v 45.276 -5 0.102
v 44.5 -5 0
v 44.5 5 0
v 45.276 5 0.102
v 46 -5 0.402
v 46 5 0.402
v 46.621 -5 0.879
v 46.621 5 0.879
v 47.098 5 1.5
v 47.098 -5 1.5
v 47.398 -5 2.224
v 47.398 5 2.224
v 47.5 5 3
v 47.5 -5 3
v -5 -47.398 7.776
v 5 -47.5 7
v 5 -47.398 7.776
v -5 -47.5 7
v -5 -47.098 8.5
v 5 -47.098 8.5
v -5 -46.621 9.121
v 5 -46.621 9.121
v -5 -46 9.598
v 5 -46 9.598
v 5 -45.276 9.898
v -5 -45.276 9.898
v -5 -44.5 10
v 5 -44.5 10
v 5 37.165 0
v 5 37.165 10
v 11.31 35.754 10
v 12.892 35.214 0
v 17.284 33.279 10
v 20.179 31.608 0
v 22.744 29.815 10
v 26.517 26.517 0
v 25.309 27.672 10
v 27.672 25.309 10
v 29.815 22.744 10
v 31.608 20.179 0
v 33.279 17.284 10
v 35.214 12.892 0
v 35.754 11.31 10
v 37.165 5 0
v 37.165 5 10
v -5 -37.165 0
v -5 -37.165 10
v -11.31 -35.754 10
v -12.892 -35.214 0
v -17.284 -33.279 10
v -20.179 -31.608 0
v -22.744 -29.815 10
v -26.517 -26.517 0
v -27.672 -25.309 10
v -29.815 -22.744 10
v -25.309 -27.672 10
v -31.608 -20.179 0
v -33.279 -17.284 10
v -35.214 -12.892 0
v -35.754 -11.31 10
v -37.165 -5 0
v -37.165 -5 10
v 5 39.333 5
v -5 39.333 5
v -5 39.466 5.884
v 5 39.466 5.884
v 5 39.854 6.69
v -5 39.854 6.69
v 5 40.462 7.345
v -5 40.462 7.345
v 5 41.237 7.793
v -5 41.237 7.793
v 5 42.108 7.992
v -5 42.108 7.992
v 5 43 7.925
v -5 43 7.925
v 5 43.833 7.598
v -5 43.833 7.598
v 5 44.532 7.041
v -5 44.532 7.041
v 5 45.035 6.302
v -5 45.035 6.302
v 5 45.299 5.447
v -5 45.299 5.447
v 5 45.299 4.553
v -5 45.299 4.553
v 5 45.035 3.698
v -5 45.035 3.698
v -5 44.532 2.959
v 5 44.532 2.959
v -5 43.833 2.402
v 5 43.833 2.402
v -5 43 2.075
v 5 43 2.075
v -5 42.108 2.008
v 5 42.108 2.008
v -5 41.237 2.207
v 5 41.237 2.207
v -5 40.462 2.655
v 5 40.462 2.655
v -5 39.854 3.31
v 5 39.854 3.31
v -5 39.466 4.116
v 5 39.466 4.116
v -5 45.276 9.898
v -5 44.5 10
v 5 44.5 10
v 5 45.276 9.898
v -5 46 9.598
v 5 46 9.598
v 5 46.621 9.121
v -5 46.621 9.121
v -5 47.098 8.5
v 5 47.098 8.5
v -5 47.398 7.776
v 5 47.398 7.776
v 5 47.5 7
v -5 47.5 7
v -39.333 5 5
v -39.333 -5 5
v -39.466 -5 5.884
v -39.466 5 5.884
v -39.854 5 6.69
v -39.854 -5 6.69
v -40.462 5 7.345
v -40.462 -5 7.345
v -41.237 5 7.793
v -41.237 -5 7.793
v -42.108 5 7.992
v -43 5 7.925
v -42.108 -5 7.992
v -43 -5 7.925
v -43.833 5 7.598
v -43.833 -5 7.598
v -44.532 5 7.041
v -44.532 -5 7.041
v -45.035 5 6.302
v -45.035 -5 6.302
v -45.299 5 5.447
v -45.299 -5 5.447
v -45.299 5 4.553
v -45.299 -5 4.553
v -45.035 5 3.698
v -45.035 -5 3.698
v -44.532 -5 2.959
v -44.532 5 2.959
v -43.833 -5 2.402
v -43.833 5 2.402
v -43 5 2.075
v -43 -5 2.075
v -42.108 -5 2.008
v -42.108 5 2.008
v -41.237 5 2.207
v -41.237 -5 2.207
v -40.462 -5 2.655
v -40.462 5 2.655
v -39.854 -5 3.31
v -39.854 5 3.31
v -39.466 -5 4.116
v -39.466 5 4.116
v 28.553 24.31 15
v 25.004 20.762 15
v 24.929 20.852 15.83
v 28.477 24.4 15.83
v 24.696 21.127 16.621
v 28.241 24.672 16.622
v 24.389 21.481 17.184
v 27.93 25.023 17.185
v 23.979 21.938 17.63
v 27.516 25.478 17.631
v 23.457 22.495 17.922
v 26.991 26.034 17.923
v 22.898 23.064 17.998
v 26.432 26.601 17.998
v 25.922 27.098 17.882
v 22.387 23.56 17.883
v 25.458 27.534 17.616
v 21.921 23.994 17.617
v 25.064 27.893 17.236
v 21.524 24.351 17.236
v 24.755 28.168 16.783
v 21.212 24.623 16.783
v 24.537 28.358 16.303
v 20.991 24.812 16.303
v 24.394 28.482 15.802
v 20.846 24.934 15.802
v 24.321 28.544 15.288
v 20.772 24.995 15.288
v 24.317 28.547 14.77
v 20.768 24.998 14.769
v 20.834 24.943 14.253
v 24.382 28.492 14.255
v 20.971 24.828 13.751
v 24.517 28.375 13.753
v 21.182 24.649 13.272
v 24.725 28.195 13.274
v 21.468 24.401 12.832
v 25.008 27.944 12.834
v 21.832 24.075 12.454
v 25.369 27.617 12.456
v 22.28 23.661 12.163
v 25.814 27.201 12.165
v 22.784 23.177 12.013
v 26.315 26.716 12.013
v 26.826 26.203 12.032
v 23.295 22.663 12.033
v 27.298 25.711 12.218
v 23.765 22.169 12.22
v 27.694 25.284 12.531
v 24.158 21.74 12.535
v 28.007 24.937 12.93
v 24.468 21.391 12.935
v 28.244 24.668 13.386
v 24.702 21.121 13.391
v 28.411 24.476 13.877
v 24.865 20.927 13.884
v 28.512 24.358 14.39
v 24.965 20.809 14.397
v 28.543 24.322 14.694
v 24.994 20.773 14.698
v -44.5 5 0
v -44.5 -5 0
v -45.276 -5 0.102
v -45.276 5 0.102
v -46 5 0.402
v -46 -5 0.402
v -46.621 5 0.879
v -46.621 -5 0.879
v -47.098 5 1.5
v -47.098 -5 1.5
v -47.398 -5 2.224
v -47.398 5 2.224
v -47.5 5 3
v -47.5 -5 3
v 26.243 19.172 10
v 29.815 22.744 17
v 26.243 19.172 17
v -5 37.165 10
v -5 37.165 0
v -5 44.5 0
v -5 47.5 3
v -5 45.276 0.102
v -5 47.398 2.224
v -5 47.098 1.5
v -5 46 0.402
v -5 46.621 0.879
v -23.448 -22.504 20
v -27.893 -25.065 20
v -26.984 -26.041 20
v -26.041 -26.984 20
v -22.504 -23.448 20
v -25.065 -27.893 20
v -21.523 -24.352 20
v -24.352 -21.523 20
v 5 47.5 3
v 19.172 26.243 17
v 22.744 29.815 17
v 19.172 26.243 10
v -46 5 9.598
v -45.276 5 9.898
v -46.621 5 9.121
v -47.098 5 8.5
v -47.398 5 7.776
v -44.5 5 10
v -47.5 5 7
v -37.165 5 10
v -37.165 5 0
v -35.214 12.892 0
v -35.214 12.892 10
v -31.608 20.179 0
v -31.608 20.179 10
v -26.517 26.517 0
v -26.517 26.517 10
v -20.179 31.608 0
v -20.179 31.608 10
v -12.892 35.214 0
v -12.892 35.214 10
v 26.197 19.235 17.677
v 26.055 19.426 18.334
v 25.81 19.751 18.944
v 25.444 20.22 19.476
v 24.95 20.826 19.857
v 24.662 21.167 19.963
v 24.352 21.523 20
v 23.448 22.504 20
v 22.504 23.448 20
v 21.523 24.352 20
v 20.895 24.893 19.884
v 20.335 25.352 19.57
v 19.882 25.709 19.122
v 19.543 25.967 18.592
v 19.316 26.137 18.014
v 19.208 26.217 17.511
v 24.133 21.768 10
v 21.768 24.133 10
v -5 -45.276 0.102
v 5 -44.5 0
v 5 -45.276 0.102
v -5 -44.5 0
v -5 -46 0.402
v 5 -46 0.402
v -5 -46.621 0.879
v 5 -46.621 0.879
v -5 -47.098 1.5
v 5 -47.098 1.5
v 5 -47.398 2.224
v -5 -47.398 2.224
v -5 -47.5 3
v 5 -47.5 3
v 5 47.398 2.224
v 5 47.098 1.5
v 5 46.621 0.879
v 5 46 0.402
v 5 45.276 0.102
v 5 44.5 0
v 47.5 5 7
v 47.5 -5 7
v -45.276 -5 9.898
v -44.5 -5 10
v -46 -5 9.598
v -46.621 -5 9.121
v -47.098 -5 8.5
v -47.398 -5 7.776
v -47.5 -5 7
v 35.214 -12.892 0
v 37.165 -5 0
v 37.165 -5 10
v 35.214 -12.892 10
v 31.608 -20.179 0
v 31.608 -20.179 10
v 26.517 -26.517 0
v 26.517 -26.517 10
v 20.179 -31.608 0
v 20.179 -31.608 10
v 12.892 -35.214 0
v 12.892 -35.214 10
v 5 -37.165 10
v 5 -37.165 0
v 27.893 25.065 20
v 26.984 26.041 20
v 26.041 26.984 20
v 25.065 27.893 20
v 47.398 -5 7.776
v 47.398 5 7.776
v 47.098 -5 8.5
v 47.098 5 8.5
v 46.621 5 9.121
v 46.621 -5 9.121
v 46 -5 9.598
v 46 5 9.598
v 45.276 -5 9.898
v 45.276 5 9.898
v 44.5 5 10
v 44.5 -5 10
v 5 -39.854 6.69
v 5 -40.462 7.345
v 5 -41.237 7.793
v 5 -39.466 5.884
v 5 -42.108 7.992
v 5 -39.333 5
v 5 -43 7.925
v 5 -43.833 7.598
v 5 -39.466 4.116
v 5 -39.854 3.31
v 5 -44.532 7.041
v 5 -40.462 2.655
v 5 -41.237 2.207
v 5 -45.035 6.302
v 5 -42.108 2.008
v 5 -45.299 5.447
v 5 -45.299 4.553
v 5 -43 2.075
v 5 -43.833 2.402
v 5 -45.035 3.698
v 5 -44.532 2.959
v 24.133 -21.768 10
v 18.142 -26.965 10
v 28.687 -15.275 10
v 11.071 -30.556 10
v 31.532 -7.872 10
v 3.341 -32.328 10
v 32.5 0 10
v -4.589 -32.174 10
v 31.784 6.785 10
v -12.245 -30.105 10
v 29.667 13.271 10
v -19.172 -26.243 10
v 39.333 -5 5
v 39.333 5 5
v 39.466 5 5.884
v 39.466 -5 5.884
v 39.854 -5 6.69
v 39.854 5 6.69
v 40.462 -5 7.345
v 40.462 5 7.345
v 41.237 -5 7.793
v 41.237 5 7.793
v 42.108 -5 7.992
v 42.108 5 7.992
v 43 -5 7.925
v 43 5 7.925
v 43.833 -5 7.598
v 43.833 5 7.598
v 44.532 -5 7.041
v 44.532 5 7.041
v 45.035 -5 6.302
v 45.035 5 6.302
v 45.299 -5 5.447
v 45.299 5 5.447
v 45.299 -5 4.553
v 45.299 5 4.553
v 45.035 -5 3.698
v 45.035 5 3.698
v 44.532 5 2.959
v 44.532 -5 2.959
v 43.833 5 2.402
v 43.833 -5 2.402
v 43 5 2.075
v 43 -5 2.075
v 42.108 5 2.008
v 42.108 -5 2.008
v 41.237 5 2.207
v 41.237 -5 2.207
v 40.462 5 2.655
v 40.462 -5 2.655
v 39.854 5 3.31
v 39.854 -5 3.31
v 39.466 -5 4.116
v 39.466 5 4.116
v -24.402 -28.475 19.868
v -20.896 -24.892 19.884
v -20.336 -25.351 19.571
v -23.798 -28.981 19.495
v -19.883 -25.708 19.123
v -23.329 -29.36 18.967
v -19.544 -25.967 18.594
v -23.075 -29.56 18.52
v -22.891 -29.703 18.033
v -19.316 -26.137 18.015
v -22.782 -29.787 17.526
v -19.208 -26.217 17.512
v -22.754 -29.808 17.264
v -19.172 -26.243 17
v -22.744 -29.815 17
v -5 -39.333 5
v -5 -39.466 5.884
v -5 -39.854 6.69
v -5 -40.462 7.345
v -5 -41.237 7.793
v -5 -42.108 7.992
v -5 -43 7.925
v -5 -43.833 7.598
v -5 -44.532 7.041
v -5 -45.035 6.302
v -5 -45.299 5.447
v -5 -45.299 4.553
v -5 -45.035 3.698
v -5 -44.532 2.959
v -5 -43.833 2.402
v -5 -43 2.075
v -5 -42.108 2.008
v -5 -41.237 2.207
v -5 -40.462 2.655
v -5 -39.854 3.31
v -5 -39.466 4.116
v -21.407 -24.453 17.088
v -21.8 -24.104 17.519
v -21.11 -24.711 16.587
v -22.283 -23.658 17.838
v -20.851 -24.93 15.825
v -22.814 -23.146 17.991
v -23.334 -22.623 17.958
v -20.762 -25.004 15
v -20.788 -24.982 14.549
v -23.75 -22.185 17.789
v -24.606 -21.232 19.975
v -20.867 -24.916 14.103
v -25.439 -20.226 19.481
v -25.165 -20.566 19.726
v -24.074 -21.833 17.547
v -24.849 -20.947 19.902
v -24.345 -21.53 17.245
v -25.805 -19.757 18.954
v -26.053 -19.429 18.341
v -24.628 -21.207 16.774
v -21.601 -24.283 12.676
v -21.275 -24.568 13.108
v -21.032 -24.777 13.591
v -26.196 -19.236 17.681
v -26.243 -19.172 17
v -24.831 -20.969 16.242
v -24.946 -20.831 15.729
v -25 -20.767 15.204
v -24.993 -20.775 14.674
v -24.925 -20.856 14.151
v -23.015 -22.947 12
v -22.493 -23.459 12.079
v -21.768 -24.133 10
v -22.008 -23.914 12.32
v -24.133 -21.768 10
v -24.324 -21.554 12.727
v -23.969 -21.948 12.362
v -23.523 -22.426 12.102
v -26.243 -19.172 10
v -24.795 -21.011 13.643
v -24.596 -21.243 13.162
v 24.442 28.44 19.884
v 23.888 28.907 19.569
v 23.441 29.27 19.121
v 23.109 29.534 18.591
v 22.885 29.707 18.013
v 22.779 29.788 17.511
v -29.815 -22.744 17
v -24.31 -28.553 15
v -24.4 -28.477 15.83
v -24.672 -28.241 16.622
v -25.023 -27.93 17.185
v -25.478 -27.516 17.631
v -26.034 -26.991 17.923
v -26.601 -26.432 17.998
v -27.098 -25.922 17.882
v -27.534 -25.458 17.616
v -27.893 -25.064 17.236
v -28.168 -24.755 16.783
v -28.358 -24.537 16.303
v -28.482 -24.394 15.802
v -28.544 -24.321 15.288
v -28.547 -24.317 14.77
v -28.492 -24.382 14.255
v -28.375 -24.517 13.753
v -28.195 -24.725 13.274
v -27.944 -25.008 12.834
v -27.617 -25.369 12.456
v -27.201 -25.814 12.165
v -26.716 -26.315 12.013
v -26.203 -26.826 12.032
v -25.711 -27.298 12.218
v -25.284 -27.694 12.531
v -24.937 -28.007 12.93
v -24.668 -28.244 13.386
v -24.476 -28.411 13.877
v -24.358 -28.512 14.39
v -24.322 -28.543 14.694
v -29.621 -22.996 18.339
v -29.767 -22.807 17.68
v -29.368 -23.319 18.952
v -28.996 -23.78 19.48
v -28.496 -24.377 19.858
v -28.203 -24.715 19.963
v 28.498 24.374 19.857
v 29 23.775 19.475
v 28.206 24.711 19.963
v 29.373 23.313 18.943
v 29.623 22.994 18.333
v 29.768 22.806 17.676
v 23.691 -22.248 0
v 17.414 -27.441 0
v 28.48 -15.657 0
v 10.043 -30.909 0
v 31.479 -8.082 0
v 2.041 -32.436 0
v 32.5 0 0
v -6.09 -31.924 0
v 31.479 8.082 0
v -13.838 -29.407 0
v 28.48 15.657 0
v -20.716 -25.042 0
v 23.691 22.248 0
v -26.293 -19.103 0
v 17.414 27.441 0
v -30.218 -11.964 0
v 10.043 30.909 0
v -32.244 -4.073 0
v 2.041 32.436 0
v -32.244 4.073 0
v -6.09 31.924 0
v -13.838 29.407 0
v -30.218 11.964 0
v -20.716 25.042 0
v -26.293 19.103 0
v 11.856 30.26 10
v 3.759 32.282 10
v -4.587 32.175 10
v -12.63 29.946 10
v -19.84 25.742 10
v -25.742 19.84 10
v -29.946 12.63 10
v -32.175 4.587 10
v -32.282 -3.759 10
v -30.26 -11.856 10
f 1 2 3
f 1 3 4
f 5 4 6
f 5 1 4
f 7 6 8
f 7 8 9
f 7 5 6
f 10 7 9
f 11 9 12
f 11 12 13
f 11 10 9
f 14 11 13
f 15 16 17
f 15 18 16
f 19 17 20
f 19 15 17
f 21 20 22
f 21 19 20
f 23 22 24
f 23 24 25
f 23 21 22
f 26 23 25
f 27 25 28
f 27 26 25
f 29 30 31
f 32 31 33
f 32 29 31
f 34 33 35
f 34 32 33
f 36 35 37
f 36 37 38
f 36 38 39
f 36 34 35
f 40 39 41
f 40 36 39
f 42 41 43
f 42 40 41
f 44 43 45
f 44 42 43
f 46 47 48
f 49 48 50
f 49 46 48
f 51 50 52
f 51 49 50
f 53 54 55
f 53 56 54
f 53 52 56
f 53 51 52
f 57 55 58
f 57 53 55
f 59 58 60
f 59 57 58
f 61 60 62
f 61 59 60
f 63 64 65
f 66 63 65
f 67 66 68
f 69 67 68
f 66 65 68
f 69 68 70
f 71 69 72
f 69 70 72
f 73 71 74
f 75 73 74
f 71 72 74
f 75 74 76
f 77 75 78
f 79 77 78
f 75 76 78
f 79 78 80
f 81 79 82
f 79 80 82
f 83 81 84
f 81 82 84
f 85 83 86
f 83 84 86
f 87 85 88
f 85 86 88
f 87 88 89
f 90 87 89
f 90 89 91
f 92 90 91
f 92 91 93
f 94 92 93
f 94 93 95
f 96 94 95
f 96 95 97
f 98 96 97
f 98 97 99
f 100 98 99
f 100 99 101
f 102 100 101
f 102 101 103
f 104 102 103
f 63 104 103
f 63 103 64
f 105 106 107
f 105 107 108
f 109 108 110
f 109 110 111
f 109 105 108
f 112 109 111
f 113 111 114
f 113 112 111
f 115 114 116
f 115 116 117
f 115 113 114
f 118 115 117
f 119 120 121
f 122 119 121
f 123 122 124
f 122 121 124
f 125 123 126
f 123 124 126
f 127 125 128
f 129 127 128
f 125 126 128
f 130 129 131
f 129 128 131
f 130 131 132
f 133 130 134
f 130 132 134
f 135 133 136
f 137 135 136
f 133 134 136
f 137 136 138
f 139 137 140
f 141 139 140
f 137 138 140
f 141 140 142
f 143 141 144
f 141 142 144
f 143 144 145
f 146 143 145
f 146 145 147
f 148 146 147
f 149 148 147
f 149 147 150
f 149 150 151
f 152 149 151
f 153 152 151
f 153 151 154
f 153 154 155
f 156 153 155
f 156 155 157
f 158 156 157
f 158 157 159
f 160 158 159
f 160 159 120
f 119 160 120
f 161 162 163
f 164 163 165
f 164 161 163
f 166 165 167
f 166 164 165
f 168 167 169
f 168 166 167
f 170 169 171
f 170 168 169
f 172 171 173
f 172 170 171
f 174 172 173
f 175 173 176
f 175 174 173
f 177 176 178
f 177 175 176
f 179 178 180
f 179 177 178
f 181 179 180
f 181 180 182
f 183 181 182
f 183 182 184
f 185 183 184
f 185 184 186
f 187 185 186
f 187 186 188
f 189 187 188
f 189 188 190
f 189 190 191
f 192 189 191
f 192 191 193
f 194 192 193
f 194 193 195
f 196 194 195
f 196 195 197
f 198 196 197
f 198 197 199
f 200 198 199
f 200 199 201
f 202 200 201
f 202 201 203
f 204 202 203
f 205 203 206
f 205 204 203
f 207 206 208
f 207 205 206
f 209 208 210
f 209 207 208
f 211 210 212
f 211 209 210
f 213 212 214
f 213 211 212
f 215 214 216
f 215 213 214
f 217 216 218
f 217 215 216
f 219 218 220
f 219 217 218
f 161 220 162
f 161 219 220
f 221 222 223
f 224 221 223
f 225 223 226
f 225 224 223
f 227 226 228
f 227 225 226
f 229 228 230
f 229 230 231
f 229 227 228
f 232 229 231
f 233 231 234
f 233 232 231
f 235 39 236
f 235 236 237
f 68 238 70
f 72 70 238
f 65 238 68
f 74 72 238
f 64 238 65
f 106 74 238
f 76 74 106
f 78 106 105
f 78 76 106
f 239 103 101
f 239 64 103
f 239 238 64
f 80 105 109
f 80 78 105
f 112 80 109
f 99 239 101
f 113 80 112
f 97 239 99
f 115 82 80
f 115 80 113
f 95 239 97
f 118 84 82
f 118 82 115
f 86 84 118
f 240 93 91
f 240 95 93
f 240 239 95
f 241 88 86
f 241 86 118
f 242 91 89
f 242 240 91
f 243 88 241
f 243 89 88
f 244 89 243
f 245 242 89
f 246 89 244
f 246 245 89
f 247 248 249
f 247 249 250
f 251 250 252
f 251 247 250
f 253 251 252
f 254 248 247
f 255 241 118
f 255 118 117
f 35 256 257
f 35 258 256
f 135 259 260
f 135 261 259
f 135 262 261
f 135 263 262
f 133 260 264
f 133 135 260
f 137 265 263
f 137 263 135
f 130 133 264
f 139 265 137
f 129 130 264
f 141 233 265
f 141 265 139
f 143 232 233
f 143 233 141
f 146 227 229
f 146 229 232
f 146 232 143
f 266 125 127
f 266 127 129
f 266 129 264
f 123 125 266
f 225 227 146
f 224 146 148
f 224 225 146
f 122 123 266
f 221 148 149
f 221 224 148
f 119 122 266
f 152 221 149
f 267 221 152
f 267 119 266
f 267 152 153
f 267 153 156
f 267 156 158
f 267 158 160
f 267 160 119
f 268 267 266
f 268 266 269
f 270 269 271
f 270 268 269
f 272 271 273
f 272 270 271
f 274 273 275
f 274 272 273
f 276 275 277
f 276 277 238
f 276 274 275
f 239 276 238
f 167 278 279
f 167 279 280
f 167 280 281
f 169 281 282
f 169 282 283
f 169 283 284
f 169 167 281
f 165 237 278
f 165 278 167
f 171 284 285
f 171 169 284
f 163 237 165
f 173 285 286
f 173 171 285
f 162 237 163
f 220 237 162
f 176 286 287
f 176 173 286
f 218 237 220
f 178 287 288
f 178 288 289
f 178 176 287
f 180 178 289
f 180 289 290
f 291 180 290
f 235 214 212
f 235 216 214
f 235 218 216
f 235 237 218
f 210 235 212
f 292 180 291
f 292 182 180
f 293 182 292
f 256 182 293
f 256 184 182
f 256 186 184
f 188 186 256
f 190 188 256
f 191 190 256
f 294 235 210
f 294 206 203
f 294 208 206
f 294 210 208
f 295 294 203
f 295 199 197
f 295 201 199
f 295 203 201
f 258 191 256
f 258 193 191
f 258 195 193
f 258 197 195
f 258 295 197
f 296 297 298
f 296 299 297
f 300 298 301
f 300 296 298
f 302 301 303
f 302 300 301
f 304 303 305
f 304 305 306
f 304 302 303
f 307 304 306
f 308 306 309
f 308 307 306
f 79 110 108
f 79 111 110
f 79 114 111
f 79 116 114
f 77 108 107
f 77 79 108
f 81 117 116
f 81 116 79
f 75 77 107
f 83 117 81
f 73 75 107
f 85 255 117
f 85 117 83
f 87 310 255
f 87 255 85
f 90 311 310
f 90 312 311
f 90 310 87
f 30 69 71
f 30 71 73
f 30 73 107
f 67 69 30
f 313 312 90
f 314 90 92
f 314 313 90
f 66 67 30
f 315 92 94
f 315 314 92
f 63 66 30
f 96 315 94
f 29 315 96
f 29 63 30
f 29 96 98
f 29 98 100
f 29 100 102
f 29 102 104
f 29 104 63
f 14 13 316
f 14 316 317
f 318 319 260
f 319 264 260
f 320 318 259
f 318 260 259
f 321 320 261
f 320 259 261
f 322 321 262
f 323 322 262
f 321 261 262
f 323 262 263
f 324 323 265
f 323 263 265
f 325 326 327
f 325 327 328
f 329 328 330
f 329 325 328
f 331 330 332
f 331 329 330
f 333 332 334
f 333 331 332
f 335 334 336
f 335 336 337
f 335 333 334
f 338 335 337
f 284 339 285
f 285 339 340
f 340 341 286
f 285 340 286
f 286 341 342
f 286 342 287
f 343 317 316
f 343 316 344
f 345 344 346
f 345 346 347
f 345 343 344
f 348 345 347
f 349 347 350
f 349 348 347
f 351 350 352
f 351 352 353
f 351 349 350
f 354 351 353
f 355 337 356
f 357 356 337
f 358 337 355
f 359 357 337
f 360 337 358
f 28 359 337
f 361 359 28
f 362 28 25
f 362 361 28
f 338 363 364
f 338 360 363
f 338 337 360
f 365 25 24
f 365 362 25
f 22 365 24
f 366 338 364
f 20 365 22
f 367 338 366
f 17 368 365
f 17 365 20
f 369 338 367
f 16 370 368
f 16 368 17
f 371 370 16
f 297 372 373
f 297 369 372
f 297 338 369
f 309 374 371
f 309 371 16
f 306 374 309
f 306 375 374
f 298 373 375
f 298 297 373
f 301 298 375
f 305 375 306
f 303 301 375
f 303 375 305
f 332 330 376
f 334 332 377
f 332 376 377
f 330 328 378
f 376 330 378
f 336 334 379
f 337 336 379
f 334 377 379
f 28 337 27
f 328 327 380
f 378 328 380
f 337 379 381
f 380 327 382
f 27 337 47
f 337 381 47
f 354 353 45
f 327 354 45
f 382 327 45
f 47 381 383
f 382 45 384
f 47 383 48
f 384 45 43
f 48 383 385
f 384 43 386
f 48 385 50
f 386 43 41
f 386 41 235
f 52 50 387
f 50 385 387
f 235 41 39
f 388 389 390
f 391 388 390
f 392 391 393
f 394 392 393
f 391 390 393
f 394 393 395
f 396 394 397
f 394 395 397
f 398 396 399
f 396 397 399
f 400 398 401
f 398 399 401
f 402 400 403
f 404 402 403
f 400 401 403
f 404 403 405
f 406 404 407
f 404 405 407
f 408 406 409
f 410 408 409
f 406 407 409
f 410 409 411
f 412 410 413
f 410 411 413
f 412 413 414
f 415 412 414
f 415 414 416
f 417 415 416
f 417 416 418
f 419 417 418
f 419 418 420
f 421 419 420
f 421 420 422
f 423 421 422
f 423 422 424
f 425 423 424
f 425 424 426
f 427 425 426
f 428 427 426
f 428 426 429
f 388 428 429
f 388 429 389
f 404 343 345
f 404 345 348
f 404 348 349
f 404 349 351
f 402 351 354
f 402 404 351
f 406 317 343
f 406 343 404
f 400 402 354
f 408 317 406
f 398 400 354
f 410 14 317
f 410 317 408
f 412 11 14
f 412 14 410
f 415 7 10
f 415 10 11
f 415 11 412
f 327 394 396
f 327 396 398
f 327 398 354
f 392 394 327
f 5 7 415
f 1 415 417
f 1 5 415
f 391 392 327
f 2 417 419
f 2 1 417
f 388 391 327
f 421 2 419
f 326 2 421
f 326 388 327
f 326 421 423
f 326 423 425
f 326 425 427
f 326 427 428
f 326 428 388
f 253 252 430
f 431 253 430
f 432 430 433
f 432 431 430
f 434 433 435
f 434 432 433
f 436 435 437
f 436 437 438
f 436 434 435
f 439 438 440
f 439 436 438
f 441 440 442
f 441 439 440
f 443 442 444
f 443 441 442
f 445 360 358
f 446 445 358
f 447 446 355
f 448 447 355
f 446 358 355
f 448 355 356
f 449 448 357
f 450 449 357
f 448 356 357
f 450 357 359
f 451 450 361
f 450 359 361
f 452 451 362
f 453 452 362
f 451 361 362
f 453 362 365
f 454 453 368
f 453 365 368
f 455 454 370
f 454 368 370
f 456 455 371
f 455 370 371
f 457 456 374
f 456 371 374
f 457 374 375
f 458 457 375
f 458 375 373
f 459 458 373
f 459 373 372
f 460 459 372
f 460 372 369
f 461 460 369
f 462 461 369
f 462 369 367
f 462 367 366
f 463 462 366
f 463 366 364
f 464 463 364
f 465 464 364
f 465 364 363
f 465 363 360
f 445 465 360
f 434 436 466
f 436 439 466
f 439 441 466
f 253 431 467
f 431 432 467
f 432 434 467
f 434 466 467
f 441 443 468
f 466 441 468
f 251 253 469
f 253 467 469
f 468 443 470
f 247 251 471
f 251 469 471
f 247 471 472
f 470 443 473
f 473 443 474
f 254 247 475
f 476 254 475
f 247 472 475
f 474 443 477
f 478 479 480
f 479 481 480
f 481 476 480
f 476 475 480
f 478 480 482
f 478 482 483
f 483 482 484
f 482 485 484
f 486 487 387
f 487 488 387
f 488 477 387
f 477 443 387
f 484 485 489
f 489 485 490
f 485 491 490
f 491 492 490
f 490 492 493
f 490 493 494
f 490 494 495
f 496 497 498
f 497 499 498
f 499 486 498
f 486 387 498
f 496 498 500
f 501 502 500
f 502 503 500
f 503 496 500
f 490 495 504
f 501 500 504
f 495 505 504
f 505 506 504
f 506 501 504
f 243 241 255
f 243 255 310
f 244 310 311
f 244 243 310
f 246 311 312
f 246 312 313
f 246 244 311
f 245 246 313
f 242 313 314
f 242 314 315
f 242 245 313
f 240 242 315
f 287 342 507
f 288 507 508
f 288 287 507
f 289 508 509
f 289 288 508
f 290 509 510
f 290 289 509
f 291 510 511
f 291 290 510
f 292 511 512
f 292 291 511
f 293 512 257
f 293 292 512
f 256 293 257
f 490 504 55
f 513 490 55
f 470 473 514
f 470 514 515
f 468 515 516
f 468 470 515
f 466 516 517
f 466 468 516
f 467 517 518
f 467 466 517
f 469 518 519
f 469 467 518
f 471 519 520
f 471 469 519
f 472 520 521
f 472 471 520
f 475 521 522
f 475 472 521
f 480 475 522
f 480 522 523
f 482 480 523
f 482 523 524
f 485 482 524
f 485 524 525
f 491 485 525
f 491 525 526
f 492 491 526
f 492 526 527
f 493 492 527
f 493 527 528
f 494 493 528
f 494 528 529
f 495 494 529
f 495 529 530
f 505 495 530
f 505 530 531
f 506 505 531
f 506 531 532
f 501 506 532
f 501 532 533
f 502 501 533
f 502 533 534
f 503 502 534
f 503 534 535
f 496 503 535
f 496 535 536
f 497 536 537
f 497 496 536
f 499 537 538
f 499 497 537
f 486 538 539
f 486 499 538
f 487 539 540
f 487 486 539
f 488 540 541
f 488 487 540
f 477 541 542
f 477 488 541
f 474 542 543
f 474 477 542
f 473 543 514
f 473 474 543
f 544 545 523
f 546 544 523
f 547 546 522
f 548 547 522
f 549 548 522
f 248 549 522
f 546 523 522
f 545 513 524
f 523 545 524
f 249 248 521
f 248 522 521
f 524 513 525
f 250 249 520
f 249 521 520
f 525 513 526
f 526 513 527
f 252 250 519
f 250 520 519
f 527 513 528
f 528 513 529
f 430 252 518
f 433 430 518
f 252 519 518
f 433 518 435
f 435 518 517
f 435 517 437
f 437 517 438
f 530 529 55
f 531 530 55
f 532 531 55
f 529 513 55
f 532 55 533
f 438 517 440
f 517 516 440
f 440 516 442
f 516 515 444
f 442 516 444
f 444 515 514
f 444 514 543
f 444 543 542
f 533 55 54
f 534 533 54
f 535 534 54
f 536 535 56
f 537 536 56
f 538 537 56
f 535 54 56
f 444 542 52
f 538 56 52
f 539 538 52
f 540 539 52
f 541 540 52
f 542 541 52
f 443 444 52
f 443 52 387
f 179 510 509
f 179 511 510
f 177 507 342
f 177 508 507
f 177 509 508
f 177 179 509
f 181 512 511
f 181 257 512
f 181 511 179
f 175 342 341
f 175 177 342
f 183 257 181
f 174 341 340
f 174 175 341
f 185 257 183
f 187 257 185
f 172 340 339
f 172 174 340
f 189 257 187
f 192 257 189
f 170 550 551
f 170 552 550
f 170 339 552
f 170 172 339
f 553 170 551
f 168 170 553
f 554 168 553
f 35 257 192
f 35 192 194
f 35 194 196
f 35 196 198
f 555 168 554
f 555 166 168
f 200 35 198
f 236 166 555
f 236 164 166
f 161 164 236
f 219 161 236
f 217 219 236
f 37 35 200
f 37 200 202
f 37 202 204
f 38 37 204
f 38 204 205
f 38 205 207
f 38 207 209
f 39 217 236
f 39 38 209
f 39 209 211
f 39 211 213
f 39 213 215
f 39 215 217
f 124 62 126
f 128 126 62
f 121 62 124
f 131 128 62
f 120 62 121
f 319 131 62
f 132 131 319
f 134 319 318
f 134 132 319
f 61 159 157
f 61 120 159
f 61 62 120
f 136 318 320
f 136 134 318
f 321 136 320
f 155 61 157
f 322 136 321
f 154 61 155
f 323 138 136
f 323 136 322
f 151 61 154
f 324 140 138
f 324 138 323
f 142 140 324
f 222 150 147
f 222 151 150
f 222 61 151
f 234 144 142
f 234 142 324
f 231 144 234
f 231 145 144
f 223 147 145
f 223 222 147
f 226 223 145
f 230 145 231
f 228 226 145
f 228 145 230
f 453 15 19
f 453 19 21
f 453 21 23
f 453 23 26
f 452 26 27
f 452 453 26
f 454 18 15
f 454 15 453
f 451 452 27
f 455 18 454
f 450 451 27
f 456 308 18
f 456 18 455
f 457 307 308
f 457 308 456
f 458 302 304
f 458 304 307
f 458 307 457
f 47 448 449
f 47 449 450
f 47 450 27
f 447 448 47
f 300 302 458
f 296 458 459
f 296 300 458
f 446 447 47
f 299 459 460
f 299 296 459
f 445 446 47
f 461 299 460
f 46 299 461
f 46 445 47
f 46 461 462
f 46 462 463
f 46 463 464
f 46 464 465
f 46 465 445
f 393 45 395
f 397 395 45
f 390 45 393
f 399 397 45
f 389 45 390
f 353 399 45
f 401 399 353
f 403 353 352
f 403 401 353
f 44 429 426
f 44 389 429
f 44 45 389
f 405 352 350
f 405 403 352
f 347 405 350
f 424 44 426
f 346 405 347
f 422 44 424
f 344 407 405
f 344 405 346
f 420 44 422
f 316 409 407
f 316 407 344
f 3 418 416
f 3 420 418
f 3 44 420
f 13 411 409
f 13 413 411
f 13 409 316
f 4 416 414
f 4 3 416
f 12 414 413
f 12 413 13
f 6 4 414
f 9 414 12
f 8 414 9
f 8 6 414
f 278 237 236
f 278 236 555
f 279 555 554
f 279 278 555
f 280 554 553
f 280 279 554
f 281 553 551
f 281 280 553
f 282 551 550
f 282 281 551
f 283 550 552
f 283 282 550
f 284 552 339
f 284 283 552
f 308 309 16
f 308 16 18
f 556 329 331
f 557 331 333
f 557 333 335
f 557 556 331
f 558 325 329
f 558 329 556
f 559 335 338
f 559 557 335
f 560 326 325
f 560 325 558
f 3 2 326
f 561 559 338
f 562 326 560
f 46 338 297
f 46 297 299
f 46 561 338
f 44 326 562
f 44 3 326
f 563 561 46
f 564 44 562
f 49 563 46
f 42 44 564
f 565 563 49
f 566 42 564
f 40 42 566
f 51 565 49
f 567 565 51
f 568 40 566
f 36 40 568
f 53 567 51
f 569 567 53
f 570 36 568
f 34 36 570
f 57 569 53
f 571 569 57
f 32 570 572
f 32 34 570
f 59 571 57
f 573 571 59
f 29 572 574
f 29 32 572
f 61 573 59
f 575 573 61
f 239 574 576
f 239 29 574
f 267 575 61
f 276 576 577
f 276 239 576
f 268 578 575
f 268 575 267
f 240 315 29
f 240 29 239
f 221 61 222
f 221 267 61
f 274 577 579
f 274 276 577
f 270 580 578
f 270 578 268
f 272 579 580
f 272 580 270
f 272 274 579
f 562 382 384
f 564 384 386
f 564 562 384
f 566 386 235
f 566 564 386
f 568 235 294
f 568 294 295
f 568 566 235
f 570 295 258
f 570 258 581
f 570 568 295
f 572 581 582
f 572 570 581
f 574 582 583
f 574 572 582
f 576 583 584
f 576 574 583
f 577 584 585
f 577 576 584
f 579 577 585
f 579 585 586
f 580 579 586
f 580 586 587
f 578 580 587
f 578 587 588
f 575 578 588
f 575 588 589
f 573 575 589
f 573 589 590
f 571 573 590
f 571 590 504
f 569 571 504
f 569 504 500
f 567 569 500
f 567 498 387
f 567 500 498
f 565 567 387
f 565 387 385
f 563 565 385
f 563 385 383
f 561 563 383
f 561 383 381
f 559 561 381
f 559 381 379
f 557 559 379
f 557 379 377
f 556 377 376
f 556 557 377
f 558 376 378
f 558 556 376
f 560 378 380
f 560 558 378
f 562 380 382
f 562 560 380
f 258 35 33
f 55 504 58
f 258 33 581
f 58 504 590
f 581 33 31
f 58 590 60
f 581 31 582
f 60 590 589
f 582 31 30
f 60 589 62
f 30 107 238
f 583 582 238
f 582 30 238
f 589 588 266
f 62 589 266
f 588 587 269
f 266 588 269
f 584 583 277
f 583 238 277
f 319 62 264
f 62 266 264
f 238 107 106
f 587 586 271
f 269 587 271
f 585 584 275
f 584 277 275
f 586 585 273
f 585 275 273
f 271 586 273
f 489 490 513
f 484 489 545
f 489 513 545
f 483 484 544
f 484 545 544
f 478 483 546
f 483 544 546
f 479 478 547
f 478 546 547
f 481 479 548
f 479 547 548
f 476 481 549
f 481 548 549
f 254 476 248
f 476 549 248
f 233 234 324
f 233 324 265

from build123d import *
from build123d.topology import SkipClean

# Parameters (mm, degrees)
CROQUIS1_R                 = 32.5
SALIENTE_EXTRUIR1_DEPTH    = 10
CROQUIS2_R                 = 3
CORTAR_EXTRUIR1_DEPTH      = 72.50174823
MATRIZC1_COUNT             = 4
SALIENTE_EXTRUIR2_DEPTH    = 10
CORTAR_EXTRUIR2_DEPTH      = 71.089228844
CORTAR_EXTRUIR2_DEPTH_BACK = 71.089228844
CROQUIS4_R                 = 3
REDONDEO1_R                = 3
SIMETR_A3_START            = 32.113081288
SIMETR_A3_DEPTH            = 5.333547499
SIMETR_A3_START_2          = -5
SIMETR_A3_2_DEPTH          = 10
SIMETR_A3_3_DEPTH          = 10


# Read off the part's stored shape, not the designer's step: Simetría3
with BuildPart() as part:
    # Croquis1 → Saliente-Extruir1 (new body)
    with BuildSketch(Plane.XY):
        with BuildLine():
            Line((-5, 47.5), (5, 47.5))
            Line((5, 47.5), (5, 37.165171868))
            ThreePointArc((5, 37.165171868), (26.516504294, 26.516504294), (37.165171868, 5))
            Line((37.165171868, 5), (47.5, 5))
            Line((47.5, 5), (47.5, -5))
            Line((47.5, -5), (37.165171868, -5))
            ThreePointArc((37.165171868, -5), (26.516504294, -26.516504294), (5, -37.165171868))
            Line((5, -37.165171868), (5, -47.5))
            Line((5, -47.5), (-5, -47.5))
            Line((-5, -47.5), (-5, -37.165171868))
            ThreePointArc((-5, -37.165171868), (-26.516504294, -26.516504294), (-37.165171868, -5))
            Line((-37.165171868, -5), (-47.5, -5))
            Line((-47.5, -5), (-47.5, 5))
            Line((-47.5, 5), (-37.165171868, 5))
            ThreePointArc((-37.165171868, 5), (-26.516504294, 26.516504294), (-5, 37.165171868))
            Line((-5, 37.165171868), (-5, 47.5))
        make_face()
        Circle(CROQUIS1_R, mode=Mode.SUBTRACT)
    extrude(amount=SALIENTE_EXTRUIR1_DEPTH)

    # Croquis2 → Cortar-Extruir1 (cut, through all)
    with BuildSketch(Plane(origin=(5, 0, 0), x_dir=(0, 0, -1), z_dir=(1, 0, 0))):
        with Locations(Location((-5, -42.332585934, 0), (0, 0, 90))):
            Circle(CROQUIS2_R)
    cortar_extruir1 = extrude(amount=-CORTAR_EXTRUIR1_DEPTH, mode=Mode.SUBTRACT)

    # MatrizC1: Cortar-Extruir1 ×4 about axis
    matrizc1_axis = Axis((0, 0, 10), (0, 0, 1))
    for i in range(1, MATRIZC1_COUNT):
        add(cortar_extruir1.rotate(matrizc1_axis, i * 360 / MATRIZC1_COUNT), mode=Mode.SUBTRACT)

    # Croquis3 → Saliente-Extruir2 (add)
    with SkipClean():  # the faces are left unmerged after this step: merging them gives an invalid solid
        with BuildSketch(Plane.XY.offset(10)):
            with BuildLine():
                Line((19.17184375, 26.242911562), (22.744211146, 29.815278958))
                ThreePointArc((22.744211146, 29.815278958), (26.516504294, 26.516504294), (29.815278958, 22.744211146))
                Line((29.815278958, 22.744211146), (26.242911562, 19.17184375))
                ThreePointArc((26.242911562, 19.17184375), (22.980970389, 22.980970389), (19.17184375, 26.242911562))
            make_face()
            with BuildLine():
                Line((-26.242911562, -19.17184375), (-29.815278958, -22.744211146))
                ThreePointArc((-29.815278958, -22.744211146), (-26.516504294, -26.516504294), (-22.744211146, -29.815278958))
                Line((-22.744211146, -29.815278958), (-19.17184375, -26.242911562))
                ThreePointArc((-19.17184375, -26.242911562), (-22.980970389, -22.980970389), (-26.242911562, -19.17184375))
            make_face()
        extrude(amount=SALIENTE_EXTRUIR2_DEPTH)

    # Croquis4 → Cortar-Extruir2 (cut, two sides: drawn at the far end of the back side and taken through both)
    with SkipClean():  # the faces are left unmerged after this step: merging them gives an invalid solid
        with BuildSketch(Plane(origin=(0, 0, 0), x_dir=(-0.7071067811865476, 0.7071067811865475, 0), z_dir=(-0.7071067811865475, -0.7071067811865476, 0)).offset(-CORTAR_EXTRUIR2_DEPTH_BACK)):
            with Locations(Location((0, -15, 0), (0, 0, 180))):
                Circle(CROQUIS4_R)
        extrude(amount=CORTAR_EXTRUIR2_DEPTH + CORTAR_EXTRUIR2_DEPTH_BACK, mode=Mode.SUBTRACT)

    # Redondeo1
    redondeo1_edges = [part.edges().sort_by_distance(p)[0] for p in [
        (-47.5, 0, 10),
        (0, -47.5, 0),
        (-47.5, 0, 0),
        (0, -47.5, 10),
        (-28.02909526, -20.958027448, 20),
        (-20.958027448, -28.02909526, 20),
    ]]
    fillet(redondeo1_edges, radius=REDONDEO1_R)

    # Simetría3 outline → Simetría3 (cut)
    with SkipClean():  # the faces are left unmerged after this step: merging them gives an invalid solid
        with BuildSketch(Plane(origin=(0, 0, 0), x_dir=(0.707106781186546, -0.707106781186549, 0), z_dir=(0.707106781186549, 0.707106781186546, 0)).offset(SIMETR_A3_START)):
            with BuildLine():
                Line((-5, -20), (-2, -20))
                ThreePointArc((-2, -20), (-4.121320344, -19.121320344), (-5, -17))
                Line((-5, -17), (-5, -20))
            make_face()
            with BuildLine():
                ThreePointArc((5, -17), (4.121320344, -19.121320344), (2, -20))
                Line((2, -20), (5, -20))
                Line((5, -20), (5, -17))
            make_face()
        extrude(amount=SIMETR_A3_DEPTH, mode=Mode.SUBTRACT)

    # Simetr_a3 2 outline → Simetr_a3 2 (cut)
    with SkipClean():  # the faces are left unmerged after this step: merging them gives an invalid solid
        with BuildSketch(Plane.YZ.offset(SIMETR_A3_START_2)):
            with BuildLine():
                Line((47.5, 10), (44.5, 10))
                ThreePointArc((44.5, 10), (46.621320344, 9.121320344), (47.5, 7))
                Line((47.5, 7), (47.5, 10))
            make_face()
            with BuildLine():
                Line((47.5, 0), (47.5, 3))
                ThreePointArc((47.5, 3), (46.621320344, 0.878679656), (44.5, 0))
                Line((44.5, 0), (47.5, 0))
            make_face()
        extrude(amount=SIMETR_A3_2_DEPTH, mode=Mode.SUBTRACT)

    # Simetr_a3 3 outline → Simetr_a3 3 (cut)
    with SkipClean():  # the faces are left unmerged after this step: merging them gives an invalid solid
        with BuildSketch(Plane(origin=(0, 0, 0), x_dir=(1, 0, 0), z_dir=(0, 1, 0)).offset(SIMETR_A3_START_2)):
            with BuildLine():
                Line((47.5, 0), (44.5, 0))
                ThreePointArc((44.5, 0), (46.621320344, -0.878679656), (47.5, -3))
                Line((47.5, -3), (47.5, 0))
            make_face()
            with BuildLine():
                Line((47.5, -10), (47.5, -7))
                ThreePointArc((47.5, -7), (46.621320344, -9.121320344), (44.5, -10))
                Line((44.5, -10), (47.5, -10))
            make_face()
        extrude(amount=SIMETR_A3_3_DEPTH, mode=Mode.SUBTRACT)


solid = part.part
